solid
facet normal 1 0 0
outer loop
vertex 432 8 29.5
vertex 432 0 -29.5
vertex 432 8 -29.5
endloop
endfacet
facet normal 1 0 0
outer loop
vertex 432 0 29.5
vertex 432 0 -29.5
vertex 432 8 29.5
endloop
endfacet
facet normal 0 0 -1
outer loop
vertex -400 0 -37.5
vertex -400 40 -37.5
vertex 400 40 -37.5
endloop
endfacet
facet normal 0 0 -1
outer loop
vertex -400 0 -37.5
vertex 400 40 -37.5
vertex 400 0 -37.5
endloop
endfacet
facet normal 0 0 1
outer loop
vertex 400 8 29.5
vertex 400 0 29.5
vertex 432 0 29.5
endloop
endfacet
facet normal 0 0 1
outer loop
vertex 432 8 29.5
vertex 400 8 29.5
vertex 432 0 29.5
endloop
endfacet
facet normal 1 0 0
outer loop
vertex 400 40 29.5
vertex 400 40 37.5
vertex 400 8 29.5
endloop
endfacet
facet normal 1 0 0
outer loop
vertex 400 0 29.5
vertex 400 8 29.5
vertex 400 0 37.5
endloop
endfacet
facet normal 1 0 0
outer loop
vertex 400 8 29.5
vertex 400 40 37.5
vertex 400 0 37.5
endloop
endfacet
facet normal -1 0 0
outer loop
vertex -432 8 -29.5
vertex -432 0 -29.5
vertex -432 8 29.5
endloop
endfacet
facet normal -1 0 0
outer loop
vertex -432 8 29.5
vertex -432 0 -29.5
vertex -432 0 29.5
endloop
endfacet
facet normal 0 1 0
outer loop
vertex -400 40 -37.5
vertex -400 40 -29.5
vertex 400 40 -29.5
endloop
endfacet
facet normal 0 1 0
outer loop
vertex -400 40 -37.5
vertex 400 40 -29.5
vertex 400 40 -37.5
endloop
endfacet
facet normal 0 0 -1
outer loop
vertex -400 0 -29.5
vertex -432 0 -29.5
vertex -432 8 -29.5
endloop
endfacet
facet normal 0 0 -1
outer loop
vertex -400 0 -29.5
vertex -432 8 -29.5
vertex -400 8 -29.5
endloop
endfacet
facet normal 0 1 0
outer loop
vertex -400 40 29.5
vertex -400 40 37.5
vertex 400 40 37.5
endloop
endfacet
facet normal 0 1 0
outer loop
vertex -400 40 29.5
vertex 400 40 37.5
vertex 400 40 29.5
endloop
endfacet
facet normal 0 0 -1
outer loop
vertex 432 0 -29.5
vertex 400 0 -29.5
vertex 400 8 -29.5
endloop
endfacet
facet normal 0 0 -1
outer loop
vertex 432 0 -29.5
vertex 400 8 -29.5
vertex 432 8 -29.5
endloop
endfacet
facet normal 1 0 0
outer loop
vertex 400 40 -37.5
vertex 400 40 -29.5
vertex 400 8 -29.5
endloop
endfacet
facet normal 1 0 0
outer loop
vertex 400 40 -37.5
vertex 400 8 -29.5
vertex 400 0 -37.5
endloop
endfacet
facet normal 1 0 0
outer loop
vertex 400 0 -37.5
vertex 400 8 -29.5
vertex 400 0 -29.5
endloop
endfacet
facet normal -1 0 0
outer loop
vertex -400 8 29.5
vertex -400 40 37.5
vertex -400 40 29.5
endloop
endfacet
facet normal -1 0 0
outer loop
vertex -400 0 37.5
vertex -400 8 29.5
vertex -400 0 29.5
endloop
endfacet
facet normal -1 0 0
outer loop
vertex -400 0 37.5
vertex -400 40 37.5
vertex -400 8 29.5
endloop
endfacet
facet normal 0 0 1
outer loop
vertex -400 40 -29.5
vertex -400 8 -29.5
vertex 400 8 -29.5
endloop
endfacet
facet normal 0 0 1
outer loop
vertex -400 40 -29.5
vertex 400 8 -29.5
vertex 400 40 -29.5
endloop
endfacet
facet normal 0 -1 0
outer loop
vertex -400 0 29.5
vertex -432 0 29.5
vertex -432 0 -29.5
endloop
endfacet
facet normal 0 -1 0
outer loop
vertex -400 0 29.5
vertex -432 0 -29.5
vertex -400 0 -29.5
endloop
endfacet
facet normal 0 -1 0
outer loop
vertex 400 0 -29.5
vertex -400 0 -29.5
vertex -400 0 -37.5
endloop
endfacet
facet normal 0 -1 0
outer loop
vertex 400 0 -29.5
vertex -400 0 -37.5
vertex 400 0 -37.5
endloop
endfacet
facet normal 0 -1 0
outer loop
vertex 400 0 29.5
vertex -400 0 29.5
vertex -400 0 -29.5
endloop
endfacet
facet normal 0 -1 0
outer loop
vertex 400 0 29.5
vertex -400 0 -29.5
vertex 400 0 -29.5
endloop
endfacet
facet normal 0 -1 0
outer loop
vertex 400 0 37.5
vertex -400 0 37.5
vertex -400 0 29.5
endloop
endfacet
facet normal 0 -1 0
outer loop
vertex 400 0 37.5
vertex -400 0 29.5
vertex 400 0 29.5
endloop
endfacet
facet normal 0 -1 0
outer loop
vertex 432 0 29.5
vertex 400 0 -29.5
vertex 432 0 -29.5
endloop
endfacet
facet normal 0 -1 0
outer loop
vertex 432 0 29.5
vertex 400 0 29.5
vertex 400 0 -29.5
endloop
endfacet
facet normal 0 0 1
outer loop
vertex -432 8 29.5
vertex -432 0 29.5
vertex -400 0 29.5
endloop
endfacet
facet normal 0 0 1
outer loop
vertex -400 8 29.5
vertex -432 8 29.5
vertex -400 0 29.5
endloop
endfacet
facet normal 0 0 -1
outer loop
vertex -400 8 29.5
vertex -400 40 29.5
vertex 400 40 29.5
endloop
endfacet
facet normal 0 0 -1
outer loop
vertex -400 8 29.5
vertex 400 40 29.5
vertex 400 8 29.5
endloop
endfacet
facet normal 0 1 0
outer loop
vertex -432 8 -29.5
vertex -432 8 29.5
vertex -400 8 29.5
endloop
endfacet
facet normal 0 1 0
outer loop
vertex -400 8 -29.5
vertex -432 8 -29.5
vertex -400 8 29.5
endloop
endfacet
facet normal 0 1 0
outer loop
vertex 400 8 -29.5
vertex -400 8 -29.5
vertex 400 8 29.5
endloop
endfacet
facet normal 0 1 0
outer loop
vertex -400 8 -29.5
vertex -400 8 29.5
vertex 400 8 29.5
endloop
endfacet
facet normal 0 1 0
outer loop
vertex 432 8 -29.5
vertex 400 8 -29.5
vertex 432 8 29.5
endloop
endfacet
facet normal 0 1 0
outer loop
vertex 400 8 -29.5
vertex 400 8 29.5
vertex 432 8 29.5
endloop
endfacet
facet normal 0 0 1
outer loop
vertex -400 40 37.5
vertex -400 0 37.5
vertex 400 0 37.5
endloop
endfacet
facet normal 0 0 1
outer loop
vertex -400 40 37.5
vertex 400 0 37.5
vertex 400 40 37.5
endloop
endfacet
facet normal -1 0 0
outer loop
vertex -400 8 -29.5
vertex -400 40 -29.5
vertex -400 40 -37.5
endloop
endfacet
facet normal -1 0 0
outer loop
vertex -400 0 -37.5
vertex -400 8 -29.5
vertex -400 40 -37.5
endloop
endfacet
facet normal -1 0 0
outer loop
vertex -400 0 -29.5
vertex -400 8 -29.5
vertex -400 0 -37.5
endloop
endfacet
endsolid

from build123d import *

# Parameters (mm, degrees)
C_CHANNEL_80_X_8_1_DEPTH = 800
SKETCH12_W               = 32
SKETCH12_H               = 59
BOSS_EXTRUDE1_DEPTH      = 8


with BuildPart() as part:
    # Sketch11 → C channel 80 X 8(1) (new body)
    with BuildSketch(Plane.YZ.offset(-400)):
        Polygon((0, -37.5), (0, 37.5), (40, 37.5), (40, 29.5), (8, 29.5), (8, -29.5), (40, -29.5), (40, -37.5), align=None)
    extrude(amount=C_CHANNEL_80_X_8_1_DEPTH)

    # Sketch12 → Boss-Extrude1 (add)
    with BuildSketch(Plane.XZ):
        with Locations((-416, 0)):
            Rectangle(SKETCH12_W, SKETCH12_H)
        with Locations((416, 0)):
            Rectangle(SKETCH12_W, SKETCH12_H)
    extrude(amount=-BOSS_EXTRUDE1_DEPTH)


solid = part.part
